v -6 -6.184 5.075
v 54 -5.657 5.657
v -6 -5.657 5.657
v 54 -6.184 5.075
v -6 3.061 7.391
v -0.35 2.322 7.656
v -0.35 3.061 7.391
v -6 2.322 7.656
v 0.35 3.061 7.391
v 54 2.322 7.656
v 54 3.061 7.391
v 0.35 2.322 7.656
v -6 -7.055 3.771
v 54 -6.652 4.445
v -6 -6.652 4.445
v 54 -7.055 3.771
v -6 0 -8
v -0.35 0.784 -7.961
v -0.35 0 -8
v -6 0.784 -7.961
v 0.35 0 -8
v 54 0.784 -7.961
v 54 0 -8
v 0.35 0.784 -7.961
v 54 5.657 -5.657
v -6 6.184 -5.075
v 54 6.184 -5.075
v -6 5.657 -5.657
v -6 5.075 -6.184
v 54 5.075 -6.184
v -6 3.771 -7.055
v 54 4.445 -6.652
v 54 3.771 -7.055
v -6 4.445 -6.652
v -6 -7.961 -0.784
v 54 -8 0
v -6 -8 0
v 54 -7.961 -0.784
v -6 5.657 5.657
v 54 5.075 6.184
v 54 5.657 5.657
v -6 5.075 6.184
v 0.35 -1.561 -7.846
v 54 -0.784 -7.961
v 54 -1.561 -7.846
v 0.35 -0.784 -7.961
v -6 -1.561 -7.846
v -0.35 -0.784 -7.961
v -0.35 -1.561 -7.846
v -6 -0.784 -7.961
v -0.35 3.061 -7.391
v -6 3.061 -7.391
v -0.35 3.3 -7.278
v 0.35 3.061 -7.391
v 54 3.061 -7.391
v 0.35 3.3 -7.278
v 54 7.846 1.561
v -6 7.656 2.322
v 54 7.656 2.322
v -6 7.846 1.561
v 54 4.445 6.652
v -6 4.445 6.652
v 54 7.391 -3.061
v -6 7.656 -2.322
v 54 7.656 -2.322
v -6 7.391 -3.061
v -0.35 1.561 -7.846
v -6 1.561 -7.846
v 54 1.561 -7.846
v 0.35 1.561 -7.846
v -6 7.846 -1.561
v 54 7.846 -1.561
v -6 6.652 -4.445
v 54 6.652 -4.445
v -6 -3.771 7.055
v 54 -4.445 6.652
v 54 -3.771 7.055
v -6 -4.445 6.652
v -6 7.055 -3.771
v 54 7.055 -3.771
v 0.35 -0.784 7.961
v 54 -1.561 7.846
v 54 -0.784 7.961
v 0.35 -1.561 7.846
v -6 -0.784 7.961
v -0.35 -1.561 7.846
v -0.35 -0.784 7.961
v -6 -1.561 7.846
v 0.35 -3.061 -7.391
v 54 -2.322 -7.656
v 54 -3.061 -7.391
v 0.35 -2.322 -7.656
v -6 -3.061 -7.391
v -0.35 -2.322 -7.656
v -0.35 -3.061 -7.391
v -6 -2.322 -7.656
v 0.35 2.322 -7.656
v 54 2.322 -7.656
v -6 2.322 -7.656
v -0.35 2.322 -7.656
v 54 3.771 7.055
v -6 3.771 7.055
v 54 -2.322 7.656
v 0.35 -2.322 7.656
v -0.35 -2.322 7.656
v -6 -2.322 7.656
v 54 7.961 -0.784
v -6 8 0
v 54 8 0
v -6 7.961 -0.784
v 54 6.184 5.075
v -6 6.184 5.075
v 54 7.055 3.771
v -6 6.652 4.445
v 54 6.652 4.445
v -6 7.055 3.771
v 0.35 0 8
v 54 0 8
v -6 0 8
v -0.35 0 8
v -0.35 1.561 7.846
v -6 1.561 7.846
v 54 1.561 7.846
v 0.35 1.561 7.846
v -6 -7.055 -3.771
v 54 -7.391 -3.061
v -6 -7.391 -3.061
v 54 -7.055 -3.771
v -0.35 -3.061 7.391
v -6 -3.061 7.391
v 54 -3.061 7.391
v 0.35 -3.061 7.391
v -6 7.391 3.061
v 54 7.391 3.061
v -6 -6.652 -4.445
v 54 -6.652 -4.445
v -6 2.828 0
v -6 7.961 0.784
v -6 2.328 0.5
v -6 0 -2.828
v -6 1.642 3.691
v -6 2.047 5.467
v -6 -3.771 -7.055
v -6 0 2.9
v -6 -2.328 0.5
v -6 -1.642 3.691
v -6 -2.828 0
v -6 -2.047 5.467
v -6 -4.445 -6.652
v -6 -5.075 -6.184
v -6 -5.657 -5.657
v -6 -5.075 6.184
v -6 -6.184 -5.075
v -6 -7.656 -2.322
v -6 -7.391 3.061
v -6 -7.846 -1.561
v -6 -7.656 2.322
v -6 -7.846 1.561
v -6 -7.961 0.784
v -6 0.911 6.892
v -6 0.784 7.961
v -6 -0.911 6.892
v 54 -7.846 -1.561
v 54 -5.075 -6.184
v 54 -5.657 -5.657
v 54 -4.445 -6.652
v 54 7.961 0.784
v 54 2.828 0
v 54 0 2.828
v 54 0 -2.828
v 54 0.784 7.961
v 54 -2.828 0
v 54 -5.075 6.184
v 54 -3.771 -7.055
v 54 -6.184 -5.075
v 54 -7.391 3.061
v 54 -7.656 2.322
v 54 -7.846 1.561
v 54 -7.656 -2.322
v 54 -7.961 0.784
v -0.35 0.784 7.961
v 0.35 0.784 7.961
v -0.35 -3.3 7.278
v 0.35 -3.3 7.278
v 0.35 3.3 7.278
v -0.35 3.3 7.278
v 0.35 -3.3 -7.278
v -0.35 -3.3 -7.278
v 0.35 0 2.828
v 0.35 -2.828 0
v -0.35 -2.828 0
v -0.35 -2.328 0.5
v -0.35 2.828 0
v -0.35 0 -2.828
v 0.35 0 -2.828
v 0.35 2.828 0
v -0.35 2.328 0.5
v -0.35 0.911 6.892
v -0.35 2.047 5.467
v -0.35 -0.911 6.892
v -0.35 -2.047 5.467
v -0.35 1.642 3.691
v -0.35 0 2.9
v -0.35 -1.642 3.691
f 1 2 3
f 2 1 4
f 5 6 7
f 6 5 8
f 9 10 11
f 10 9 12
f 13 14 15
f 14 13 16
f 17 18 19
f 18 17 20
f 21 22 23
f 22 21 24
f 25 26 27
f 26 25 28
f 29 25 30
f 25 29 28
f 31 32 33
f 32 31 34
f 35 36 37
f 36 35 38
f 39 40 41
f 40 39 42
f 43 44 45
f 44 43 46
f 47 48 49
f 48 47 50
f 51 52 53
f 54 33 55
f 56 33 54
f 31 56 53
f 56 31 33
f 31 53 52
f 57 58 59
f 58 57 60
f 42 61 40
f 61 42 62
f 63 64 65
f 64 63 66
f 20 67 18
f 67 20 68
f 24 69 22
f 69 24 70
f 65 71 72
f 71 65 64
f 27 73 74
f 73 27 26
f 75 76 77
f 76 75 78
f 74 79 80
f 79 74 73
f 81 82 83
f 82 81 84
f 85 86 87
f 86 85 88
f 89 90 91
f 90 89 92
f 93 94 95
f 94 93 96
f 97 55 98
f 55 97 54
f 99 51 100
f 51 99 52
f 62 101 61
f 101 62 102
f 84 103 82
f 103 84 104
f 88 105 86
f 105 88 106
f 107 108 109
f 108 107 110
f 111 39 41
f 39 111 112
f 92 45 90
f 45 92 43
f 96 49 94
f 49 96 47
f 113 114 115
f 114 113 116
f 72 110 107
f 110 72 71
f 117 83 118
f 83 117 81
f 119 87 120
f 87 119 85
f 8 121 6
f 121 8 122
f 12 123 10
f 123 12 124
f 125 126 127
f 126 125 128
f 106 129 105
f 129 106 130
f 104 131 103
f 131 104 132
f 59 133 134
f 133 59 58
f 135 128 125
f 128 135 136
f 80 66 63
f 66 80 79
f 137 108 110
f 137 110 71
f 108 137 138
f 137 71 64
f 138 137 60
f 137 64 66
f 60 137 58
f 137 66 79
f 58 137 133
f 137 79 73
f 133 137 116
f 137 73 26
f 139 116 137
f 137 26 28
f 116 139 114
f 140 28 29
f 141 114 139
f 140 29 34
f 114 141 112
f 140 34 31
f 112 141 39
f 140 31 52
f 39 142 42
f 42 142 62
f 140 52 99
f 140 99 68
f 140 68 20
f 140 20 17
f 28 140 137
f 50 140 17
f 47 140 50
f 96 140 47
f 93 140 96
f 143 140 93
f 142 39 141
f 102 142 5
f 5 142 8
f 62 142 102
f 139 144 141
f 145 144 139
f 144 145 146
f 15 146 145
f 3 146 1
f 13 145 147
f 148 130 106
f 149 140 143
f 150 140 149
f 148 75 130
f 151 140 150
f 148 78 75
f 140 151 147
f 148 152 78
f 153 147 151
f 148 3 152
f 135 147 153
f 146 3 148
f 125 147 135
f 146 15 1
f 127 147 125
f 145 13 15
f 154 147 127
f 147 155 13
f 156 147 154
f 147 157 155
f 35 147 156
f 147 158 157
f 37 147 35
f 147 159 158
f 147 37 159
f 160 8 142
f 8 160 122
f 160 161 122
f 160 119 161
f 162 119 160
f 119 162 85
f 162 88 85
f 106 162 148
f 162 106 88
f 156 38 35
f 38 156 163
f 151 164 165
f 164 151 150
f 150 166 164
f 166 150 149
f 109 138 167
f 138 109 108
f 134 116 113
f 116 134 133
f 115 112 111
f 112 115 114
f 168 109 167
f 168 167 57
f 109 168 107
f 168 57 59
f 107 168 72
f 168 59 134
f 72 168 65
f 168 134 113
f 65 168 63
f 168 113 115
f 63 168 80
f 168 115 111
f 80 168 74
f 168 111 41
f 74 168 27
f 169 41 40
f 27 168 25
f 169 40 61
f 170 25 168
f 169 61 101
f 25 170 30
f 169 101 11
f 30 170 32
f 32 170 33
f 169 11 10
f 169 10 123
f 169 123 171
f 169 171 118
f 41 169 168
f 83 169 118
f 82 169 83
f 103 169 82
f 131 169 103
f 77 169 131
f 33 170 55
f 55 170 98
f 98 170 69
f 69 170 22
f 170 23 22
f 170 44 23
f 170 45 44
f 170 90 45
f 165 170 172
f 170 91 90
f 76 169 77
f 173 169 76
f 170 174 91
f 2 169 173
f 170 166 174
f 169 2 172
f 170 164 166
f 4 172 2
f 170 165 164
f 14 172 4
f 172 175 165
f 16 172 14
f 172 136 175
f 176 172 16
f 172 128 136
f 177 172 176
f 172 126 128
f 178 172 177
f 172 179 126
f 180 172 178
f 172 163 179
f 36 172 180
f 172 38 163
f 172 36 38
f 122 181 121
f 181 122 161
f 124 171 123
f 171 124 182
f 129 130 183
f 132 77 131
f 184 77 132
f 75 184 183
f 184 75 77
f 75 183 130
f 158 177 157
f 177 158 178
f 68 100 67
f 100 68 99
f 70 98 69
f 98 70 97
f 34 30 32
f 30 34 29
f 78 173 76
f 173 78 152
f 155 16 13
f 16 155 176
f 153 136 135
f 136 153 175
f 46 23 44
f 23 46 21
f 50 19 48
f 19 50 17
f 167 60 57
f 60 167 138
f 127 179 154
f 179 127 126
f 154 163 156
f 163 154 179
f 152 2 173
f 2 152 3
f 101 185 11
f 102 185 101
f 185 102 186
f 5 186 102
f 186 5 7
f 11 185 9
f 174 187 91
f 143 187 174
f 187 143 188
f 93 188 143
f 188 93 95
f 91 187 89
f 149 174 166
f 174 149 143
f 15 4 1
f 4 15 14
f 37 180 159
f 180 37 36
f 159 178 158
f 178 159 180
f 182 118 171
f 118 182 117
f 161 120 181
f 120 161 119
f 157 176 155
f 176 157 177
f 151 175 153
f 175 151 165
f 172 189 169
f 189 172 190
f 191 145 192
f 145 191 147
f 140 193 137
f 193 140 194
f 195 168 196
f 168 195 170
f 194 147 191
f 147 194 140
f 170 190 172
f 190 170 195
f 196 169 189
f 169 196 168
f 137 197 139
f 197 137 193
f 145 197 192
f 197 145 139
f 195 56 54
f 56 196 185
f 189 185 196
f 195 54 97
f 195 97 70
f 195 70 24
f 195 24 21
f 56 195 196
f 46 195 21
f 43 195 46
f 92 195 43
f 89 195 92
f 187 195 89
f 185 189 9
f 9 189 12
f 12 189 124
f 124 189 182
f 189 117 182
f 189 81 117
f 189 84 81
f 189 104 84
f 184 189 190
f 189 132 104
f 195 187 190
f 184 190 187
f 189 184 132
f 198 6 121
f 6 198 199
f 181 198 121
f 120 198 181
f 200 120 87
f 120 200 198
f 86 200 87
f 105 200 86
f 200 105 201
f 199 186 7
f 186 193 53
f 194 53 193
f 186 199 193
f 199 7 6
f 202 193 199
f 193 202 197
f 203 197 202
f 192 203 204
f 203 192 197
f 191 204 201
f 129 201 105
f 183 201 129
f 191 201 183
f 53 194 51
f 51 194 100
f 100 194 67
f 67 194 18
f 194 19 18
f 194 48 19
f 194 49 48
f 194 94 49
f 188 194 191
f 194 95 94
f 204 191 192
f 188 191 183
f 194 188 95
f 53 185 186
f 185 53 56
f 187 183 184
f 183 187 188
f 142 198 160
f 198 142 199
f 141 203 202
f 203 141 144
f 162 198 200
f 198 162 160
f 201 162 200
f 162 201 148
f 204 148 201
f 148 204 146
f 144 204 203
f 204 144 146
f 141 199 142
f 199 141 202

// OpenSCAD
//blade (olfa)
//color("grey")cube([0.6,6.5,39],center = true);
difference(){
union(){
difference(){
  translate([24,0,0]) rotate([0,90,0])cylinder(d=16,h=60,center=true,$fn=64);
  translate([24,0,0]) rotate([45,0,0]) cube([65,4,4],center=true);

}
translate([-3,0,3])cube([6,5,5],center=true);
}
cube([0.7,6.6,39],center = true);
translate([-7.5,0,5]) rotate([0,90,0])cylinder(d=4.2,h=15,center=true);
}
